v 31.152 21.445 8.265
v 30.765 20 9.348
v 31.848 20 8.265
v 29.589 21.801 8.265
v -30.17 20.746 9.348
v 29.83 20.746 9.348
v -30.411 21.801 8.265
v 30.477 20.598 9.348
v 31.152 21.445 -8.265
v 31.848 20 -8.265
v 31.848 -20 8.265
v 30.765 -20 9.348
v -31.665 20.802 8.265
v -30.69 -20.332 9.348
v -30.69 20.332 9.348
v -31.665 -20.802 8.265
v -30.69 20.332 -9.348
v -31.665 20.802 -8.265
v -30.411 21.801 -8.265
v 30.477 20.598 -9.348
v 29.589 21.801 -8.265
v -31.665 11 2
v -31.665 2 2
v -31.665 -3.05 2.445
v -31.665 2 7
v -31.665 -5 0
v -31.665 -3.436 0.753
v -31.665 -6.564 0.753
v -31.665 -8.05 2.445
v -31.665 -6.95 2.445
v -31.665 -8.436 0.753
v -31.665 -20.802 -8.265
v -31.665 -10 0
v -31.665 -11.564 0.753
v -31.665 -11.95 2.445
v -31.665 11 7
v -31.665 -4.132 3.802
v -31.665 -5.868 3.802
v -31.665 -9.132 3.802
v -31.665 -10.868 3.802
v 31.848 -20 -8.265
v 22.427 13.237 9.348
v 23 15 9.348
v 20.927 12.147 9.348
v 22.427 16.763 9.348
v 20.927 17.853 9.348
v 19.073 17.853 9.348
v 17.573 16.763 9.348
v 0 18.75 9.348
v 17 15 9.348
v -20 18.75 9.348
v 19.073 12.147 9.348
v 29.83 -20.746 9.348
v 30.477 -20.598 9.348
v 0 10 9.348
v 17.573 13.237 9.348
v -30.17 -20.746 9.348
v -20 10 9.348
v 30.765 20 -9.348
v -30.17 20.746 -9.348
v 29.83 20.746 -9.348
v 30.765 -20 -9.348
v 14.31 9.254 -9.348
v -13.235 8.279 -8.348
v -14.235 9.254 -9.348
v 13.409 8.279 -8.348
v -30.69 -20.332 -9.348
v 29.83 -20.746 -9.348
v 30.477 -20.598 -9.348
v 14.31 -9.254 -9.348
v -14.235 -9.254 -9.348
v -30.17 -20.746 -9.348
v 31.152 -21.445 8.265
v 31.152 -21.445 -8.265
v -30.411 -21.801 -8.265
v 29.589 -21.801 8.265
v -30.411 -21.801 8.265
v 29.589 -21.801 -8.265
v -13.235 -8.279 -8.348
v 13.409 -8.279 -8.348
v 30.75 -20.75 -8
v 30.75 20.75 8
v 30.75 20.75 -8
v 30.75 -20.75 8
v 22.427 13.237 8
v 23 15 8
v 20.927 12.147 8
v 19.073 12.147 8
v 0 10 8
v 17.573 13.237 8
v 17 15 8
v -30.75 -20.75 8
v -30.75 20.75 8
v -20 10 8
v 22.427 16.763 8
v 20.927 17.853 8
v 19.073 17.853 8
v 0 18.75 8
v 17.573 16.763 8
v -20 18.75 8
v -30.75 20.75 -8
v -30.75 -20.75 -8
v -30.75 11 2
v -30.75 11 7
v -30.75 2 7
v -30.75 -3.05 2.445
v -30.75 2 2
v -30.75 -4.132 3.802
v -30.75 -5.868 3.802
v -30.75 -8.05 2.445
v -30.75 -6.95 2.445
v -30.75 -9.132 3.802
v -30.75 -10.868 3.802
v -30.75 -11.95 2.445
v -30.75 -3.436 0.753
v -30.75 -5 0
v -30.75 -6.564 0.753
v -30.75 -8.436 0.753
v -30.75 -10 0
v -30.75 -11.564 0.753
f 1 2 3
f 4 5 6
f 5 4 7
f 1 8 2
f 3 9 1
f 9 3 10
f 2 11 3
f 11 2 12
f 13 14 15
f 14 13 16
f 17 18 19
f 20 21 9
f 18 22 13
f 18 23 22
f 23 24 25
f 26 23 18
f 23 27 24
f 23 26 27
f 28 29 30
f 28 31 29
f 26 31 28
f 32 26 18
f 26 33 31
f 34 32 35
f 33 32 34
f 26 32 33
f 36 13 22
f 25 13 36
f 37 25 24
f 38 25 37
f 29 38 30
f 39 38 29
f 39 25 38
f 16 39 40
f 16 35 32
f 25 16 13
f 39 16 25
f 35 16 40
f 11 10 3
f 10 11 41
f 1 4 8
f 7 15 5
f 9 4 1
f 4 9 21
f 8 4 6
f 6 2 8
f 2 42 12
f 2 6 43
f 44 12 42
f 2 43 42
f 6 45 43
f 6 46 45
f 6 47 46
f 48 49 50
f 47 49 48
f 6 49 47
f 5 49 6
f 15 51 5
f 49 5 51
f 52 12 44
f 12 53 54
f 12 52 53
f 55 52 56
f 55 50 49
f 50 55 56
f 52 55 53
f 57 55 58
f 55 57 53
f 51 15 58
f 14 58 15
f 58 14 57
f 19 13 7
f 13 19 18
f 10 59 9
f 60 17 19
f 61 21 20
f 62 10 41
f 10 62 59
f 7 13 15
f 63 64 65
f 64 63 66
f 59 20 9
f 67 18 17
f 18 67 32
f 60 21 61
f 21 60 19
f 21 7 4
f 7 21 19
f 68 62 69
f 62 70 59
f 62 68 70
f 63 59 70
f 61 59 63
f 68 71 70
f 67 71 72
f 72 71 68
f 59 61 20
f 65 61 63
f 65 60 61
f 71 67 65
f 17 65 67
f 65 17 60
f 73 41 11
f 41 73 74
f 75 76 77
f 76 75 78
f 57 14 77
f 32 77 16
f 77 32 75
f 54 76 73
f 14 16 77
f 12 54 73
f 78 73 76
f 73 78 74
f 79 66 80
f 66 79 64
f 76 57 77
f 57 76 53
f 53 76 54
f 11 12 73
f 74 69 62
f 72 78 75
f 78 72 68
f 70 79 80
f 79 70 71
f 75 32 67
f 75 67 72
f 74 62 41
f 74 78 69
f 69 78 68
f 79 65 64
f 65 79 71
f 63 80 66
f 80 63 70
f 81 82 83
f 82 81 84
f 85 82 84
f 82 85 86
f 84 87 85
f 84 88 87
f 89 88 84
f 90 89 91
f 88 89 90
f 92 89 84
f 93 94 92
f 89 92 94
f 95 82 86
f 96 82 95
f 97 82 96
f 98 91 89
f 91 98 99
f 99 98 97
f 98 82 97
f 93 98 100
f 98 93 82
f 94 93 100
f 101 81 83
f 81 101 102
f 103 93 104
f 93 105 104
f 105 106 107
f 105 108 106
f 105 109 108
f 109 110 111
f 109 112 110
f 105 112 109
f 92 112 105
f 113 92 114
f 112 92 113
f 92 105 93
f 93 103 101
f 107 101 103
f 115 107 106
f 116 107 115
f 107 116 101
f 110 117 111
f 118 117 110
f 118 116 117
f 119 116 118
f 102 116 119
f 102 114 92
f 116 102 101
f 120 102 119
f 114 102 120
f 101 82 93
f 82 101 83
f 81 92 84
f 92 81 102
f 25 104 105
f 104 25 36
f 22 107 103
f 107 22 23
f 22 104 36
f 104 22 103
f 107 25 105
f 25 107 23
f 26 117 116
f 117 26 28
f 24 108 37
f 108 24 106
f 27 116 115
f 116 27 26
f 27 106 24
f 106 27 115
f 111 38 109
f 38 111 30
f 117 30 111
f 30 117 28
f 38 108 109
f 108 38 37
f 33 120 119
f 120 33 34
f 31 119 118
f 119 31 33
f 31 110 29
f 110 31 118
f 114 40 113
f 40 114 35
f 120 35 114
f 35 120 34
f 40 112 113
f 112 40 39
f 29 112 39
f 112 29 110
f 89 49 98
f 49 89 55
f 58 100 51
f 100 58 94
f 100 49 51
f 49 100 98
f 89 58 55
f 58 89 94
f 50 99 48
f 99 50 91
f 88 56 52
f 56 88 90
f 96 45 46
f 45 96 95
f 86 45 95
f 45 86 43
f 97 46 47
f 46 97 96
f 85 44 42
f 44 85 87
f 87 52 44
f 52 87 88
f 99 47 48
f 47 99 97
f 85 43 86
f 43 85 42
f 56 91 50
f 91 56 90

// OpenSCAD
module enclosure() {

/* Next, we call the difference function. This specifies that we will be subtracting the second object we call from the first. We will use this to make our cube hollow. */

difference() {

/* The first object will be our main cube. to give the cube rounded edges, we call minkowski, which will trace the shape we specify around the edges. We will use a sphere, so that the hard edges of the cube will take on the shape of the sphere. */

minkowski()
{

/* Lastly, I am calling difference again here because I wanted to add a small indentation to the bottom of the cube so that it would be more comfortable to hold. Again, difference subtracts the second object from the first, so here, we see a cube; and then an offset (translated), smaller cube(); */

difference()
{
cube([60,40,15], center=true);
translate([-15,-10,-8])
cube([30,20,1.5]);
};

/* Having constructed the main box, we can now specify the size of the sphere that we will use to round the edges. */

sphere(2);
};

/* Having specified our main enclosure body with rounded edges and an indentation on the bottom, we finally hollow it out. */

cube([61.5,41.5,16], center=true);
}
}

module enclosureHoles() {

/* This section of the code constructs all of the independent holes and joins them into a uniform object. */

union() {

// USB
translate([-38,2,2])
cube([10, 9, 5]);
    
// button #1
translate([-38,-5,2])
rotate([0,90,0])
cylinder(r=2, h=30);
    
    // button #1
translate([-38,-10,2])
rotate([0,90,0])
cylinder(r=2, h=30);

// Screen
translate([-20,10,5.5])
cube([20, 8.75, 5]);

// breakout
//translate([22,-10,0])
//cube([10, 23, 8]);
    
// Volume Pot
//translate([0,-15.75,5.5])
//rotate([0,0,0])
//cylinder(r=1.25, h=5);

// Mic
translate([20,15,5.5])
rotate([0,0,0])
cylinder(r=3, h=5);

// Pushbutton #2
//translate([23.5,-12,5.5])
//rotate([0,0,0])
//cylinder(r=4.75, h=5);

// Pushbutton #3
//translate([-21.5,0,5.5])
//rotate([0,0,0])
//cylinder(r=4.75, h=5);

// Pushbutton #4
//translate([-23.5,-12,5.5])
//rotate([0,0,0])
//cylinder(r=4.75, h=5);
}
}

module texture() {
translate([0,0,9])
scale([.41,.36,.006]) surface(file="/Users/YourUsername/Path/To/Your/File/fileName.png",
center=true);
}

module concat() {

/* Difference subtracts the second object from the first */

difference() {

/* Our first object is the Union of two objects. Here, union attaches the texture to the enclosure. */

union() {
texture();
enclosure();
};

/* the semicolon signals that that is a complete object. Now the second object is the one we made from the various holes. */

enclosureHoles();
}
}

/* To render the entire design, run: */

concat();

/* To actually print, we’ll need to render it in two separate halves which we will attach later. So, comment out the above concat() command and instead run the below code to render the top only */

difference() {
concat();
translate([0,0,-8.5])
cube([65,44,2], center=true);
}

/* then, comment the above out and run the following code to render the bottom only */

difference() {
concat();
translate([0,0,2])
cube([65,44,16], center=true);
}
